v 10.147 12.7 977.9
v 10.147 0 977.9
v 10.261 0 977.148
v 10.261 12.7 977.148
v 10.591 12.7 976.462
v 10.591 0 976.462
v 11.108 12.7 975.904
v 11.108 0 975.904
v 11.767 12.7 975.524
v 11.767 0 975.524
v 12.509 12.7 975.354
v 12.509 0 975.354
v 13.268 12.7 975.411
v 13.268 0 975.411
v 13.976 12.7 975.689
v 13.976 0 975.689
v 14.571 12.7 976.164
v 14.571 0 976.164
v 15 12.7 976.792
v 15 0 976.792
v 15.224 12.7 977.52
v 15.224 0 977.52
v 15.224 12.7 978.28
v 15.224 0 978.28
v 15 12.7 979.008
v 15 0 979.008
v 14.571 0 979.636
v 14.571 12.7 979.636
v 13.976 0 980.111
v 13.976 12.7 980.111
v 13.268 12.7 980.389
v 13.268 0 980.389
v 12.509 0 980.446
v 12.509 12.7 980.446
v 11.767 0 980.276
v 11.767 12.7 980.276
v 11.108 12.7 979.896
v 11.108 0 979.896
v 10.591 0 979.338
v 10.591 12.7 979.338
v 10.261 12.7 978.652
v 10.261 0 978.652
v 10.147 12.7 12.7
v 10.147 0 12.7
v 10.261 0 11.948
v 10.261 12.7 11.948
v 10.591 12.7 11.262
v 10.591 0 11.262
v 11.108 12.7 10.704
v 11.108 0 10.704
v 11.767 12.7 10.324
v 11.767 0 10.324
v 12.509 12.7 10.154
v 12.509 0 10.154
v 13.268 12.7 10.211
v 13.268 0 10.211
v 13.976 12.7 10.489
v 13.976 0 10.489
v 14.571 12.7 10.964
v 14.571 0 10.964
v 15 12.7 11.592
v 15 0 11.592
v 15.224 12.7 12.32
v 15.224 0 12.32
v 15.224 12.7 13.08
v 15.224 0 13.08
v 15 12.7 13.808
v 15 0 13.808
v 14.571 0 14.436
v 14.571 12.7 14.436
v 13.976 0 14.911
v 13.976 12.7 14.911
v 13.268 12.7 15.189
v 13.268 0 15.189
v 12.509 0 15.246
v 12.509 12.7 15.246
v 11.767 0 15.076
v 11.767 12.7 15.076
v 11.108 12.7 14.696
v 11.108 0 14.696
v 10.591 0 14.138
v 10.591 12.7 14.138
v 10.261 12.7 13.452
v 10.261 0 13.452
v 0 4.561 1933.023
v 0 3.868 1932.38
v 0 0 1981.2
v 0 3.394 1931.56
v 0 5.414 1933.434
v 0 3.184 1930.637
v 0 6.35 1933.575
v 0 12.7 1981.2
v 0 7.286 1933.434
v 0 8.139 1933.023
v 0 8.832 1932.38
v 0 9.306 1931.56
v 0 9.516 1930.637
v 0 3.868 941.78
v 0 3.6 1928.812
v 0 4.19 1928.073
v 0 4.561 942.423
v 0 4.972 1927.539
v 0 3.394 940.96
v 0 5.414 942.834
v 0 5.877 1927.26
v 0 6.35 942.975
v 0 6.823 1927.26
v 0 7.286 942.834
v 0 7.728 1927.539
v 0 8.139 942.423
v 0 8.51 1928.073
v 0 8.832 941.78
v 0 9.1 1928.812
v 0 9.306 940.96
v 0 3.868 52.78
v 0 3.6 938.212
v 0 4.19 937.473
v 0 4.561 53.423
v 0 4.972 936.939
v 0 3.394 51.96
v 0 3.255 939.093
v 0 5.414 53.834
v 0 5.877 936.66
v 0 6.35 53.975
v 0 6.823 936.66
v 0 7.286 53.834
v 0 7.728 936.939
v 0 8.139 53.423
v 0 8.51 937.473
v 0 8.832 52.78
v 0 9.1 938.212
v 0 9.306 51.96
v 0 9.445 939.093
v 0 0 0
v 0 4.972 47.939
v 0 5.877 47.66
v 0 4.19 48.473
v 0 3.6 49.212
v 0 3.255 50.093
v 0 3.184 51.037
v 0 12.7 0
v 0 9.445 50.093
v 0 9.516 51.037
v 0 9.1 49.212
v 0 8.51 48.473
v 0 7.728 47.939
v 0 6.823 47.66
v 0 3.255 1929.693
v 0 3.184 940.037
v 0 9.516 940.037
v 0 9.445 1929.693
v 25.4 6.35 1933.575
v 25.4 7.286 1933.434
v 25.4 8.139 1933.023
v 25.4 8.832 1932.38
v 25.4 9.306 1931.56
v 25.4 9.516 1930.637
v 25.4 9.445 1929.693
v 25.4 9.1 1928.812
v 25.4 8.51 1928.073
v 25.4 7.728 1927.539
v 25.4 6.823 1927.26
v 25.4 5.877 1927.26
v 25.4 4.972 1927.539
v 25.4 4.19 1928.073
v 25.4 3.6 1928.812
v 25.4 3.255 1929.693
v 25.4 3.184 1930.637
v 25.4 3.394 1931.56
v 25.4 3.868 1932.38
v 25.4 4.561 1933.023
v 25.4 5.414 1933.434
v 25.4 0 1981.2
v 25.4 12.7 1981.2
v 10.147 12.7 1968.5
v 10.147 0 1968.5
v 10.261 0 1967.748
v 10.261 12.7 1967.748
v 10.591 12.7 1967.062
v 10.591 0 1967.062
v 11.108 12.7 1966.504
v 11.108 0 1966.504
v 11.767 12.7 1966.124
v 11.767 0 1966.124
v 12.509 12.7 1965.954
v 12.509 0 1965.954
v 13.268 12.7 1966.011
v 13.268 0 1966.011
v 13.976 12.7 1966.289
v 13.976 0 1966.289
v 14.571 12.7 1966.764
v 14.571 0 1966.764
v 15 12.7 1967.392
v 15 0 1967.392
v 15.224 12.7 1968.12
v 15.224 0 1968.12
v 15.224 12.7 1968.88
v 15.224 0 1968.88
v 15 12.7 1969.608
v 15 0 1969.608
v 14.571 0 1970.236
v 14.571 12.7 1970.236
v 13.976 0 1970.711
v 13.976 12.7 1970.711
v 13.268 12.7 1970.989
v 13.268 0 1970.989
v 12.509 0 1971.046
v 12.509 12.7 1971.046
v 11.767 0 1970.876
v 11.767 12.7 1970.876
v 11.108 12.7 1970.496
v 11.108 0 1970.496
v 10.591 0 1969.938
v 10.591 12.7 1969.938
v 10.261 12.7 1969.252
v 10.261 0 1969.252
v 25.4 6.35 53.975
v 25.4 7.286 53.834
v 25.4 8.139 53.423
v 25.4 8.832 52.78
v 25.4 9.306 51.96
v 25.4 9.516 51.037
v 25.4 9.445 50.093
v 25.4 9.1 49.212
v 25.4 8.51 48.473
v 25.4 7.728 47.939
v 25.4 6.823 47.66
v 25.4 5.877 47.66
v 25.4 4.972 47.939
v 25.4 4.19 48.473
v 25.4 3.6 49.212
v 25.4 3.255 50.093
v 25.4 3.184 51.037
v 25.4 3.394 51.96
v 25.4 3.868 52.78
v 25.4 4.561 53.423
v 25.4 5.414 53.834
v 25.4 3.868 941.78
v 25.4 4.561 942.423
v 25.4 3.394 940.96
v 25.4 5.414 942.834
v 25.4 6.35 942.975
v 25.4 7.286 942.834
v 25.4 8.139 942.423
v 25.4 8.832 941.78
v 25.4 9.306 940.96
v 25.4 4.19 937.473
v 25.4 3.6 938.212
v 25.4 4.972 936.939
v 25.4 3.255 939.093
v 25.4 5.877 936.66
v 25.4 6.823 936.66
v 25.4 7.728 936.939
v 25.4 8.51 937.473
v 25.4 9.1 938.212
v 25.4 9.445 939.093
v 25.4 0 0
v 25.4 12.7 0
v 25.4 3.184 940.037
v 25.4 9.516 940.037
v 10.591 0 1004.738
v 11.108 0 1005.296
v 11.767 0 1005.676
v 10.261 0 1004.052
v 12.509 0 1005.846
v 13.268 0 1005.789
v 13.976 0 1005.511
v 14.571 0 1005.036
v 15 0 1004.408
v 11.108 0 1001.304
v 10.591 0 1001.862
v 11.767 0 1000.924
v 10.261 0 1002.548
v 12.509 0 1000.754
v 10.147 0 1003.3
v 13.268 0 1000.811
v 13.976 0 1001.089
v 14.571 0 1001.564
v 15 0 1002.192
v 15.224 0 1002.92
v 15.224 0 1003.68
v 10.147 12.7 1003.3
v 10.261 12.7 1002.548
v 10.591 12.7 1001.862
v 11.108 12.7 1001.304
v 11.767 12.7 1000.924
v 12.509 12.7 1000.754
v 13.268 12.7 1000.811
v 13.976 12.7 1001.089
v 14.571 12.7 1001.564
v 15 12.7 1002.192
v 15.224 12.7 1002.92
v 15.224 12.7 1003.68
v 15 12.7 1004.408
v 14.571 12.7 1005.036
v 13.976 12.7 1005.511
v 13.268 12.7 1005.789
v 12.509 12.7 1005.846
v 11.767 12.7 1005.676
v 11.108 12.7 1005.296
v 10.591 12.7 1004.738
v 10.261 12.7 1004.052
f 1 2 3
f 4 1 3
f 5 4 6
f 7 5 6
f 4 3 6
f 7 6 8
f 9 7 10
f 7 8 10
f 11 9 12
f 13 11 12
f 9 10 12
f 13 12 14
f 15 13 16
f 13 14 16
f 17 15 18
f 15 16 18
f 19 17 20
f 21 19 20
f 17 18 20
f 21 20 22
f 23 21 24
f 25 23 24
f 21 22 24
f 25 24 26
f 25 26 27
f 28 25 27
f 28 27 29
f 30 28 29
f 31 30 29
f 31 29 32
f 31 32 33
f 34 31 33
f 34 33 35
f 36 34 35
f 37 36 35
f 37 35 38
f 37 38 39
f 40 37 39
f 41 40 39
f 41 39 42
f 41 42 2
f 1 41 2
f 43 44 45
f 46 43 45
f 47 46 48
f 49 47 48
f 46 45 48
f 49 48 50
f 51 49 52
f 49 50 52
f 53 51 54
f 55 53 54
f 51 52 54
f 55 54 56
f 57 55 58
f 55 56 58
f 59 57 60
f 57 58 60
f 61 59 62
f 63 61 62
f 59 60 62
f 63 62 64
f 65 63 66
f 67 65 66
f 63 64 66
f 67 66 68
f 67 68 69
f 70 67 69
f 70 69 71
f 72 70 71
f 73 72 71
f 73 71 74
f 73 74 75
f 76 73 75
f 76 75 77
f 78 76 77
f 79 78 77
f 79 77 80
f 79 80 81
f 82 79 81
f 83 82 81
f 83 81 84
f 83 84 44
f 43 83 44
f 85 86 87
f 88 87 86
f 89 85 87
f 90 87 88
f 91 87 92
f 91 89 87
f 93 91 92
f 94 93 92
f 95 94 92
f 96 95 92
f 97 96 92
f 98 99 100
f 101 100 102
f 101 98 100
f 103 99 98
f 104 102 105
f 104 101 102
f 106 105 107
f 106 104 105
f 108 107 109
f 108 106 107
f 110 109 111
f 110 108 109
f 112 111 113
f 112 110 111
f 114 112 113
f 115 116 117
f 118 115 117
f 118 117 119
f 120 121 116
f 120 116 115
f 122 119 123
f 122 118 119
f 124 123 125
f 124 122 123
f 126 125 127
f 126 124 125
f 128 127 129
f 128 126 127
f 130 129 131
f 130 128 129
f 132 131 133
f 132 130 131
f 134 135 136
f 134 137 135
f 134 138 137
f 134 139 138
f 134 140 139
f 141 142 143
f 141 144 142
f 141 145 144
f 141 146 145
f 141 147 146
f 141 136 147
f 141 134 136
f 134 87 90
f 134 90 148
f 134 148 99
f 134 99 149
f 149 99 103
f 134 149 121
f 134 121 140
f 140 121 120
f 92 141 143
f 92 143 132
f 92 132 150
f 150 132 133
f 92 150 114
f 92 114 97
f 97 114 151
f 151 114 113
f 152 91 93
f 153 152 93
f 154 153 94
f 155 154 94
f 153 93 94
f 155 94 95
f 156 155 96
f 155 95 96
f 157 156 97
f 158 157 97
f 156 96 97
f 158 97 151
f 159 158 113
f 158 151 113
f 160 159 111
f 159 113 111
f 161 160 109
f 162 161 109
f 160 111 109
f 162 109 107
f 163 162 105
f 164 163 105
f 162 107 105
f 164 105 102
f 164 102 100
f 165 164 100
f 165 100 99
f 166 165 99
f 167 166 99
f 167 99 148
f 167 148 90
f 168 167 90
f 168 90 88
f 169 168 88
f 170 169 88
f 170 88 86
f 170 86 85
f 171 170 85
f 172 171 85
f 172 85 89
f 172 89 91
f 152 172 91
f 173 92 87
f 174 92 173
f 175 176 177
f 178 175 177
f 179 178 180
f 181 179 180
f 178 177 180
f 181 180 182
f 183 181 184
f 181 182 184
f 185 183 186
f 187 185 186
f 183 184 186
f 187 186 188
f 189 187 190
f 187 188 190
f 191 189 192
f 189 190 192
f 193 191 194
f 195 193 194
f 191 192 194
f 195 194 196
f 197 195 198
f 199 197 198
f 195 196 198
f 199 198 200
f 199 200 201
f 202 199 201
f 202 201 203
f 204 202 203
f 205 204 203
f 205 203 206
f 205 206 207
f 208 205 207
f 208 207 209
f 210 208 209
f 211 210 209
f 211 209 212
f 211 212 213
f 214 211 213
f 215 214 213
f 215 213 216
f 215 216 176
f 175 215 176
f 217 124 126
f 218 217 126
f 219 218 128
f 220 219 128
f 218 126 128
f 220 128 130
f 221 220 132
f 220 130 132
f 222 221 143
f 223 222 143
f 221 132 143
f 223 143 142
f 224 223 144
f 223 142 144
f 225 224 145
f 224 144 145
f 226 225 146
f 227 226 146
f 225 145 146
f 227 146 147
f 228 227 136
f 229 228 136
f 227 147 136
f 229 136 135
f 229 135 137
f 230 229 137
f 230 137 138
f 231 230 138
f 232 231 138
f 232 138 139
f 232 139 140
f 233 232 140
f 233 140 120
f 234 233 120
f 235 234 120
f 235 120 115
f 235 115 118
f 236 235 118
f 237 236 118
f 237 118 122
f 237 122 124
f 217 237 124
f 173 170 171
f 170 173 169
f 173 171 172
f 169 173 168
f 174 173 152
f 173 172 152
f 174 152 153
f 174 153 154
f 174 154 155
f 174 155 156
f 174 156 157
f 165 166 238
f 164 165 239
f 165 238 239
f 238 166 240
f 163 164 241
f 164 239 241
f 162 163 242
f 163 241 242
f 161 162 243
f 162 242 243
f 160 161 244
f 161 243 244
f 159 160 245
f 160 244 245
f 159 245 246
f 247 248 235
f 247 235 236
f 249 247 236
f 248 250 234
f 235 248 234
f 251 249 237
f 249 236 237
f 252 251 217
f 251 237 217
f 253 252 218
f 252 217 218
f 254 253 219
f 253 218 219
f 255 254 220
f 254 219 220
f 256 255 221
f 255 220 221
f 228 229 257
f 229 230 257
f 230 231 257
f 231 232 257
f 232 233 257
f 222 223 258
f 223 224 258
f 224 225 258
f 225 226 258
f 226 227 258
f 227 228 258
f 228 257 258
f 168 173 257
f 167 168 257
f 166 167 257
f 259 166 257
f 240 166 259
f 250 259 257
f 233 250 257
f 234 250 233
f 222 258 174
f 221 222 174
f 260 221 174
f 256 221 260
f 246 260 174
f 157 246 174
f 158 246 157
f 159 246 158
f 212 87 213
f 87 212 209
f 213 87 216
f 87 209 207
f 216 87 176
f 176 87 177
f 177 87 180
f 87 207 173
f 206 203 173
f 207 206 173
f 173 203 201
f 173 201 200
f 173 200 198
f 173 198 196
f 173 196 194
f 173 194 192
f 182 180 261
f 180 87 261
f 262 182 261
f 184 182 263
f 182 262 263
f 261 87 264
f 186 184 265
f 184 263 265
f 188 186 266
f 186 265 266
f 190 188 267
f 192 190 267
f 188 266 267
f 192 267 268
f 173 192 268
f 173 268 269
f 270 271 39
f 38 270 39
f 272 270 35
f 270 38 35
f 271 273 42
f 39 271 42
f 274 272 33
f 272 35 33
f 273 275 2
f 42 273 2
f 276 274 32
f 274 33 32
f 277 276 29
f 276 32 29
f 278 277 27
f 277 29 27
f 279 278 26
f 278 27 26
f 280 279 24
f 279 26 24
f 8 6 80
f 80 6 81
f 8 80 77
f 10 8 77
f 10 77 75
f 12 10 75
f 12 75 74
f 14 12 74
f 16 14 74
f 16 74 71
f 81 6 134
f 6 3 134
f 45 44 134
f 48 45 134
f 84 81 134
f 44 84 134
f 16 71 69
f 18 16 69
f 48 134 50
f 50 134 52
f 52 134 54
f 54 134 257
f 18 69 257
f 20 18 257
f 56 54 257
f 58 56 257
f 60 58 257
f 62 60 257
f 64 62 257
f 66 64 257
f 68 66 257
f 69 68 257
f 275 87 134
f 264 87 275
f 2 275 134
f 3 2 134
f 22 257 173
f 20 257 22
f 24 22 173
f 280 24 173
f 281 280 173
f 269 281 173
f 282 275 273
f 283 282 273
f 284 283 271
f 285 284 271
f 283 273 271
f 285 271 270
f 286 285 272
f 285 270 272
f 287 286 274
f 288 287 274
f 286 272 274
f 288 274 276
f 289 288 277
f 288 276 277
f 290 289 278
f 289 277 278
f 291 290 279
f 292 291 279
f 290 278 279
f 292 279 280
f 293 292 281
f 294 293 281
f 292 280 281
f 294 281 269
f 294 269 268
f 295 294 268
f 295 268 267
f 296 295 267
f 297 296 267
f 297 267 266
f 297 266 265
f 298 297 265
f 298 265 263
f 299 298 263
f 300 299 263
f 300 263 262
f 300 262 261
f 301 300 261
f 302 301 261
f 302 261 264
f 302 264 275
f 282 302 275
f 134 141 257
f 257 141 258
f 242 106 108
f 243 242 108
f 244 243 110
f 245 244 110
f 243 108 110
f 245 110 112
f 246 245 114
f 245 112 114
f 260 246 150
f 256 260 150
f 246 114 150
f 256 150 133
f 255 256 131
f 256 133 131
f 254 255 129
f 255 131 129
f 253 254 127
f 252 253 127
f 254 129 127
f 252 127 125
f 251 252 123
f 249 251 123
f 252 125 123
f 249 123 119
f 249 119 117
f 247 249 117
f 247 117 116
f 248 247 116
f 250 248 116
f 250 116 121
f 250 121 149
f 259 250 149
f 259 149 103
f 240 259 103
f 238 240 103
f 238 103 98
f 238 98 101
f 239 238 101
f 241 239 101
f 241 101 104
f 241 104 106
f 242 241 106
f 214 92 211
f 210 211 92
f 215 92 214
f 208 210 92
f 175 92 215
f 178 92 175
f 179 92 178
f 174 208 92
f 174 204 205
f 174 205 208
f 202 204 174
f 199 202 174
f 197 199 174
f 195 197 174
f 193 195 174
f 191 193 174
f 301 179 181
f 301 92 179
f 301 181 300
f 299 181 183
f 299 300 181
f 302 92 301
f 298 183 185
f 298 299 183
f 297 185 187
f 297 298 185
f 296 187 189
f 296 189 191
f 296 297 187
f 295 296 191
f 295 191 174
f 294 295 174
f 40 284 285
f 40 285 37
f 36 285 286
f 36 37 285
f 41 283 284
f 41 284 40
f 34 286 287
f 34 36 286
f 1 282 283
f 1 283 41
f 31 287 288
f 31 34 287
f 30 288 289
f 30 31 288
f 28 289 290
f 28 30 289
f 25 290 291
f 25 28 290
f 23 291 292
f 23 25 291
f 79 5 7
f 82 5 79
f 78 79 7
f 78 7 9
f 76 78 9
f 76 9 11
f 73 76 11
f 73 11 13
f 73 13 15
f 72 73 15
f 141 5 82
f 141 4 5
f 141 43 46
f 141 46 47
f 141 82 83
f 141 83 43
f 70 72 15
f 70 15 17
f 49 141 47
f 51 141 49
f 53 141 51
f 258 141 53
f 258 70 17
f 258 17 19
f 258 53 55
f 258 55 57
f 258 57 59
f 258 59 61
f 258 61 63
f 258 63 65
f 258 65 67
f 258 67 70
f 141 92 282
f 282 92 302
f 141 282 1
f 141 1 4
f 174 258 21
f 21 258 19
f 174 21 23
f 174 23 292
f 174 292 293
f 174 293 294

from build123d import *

# Parameters (mm, degrees)
SKETCH4_W                   = 25.4
SKETCH4_H                   = 12.7
BOSS_EXTRUDE2_DEPTH         = 1981.2
F_1_4_20_TAPPED_HOLE1_D     = 5.1054
F_1_4_0_25_DIAMETER_HOLE1_D = 6.35


with BuildPart() as part:
    # Sketch4 → Boss-Extrude2 (new body)
    with BuildSketch(Plane.XY):
        with Locations((12.7, 6.35)):
            Rectangle(SKETCH4_W, SKETCH4_H)
    extrude(amount=BOSS_EXTRUDE2_DEPTH)

    # 1/4-20 Tapped Hole1 (through all)
    with Locations(Plane(origin=(0, 12.7, 0), x_dir=(1, 0, 0), z_dir=(0, 1, 0))):
        with Locations((12.7, -1968.5), (12.7, -977.9), (12.7, -1003.3), (12.7, -12.7)):
            Hole(F_1_4_20_TAPPED_HOLE1_D / 2)

    # 1/4 (0.25) Diameter Hole1 (through all)
    with Locations(Plane(origin=(25.4, 0, 0), x_dir=(0, 0, -1), z_dir=(1, 0, 0))):
        with Locations((-50.8, 6.35), (-939.8, 6.35), (-1930.4, 6.35)):
            Hole(F_1_4_0_25_DIAMETER_HOLE1_D / 2)


solid = part.part
